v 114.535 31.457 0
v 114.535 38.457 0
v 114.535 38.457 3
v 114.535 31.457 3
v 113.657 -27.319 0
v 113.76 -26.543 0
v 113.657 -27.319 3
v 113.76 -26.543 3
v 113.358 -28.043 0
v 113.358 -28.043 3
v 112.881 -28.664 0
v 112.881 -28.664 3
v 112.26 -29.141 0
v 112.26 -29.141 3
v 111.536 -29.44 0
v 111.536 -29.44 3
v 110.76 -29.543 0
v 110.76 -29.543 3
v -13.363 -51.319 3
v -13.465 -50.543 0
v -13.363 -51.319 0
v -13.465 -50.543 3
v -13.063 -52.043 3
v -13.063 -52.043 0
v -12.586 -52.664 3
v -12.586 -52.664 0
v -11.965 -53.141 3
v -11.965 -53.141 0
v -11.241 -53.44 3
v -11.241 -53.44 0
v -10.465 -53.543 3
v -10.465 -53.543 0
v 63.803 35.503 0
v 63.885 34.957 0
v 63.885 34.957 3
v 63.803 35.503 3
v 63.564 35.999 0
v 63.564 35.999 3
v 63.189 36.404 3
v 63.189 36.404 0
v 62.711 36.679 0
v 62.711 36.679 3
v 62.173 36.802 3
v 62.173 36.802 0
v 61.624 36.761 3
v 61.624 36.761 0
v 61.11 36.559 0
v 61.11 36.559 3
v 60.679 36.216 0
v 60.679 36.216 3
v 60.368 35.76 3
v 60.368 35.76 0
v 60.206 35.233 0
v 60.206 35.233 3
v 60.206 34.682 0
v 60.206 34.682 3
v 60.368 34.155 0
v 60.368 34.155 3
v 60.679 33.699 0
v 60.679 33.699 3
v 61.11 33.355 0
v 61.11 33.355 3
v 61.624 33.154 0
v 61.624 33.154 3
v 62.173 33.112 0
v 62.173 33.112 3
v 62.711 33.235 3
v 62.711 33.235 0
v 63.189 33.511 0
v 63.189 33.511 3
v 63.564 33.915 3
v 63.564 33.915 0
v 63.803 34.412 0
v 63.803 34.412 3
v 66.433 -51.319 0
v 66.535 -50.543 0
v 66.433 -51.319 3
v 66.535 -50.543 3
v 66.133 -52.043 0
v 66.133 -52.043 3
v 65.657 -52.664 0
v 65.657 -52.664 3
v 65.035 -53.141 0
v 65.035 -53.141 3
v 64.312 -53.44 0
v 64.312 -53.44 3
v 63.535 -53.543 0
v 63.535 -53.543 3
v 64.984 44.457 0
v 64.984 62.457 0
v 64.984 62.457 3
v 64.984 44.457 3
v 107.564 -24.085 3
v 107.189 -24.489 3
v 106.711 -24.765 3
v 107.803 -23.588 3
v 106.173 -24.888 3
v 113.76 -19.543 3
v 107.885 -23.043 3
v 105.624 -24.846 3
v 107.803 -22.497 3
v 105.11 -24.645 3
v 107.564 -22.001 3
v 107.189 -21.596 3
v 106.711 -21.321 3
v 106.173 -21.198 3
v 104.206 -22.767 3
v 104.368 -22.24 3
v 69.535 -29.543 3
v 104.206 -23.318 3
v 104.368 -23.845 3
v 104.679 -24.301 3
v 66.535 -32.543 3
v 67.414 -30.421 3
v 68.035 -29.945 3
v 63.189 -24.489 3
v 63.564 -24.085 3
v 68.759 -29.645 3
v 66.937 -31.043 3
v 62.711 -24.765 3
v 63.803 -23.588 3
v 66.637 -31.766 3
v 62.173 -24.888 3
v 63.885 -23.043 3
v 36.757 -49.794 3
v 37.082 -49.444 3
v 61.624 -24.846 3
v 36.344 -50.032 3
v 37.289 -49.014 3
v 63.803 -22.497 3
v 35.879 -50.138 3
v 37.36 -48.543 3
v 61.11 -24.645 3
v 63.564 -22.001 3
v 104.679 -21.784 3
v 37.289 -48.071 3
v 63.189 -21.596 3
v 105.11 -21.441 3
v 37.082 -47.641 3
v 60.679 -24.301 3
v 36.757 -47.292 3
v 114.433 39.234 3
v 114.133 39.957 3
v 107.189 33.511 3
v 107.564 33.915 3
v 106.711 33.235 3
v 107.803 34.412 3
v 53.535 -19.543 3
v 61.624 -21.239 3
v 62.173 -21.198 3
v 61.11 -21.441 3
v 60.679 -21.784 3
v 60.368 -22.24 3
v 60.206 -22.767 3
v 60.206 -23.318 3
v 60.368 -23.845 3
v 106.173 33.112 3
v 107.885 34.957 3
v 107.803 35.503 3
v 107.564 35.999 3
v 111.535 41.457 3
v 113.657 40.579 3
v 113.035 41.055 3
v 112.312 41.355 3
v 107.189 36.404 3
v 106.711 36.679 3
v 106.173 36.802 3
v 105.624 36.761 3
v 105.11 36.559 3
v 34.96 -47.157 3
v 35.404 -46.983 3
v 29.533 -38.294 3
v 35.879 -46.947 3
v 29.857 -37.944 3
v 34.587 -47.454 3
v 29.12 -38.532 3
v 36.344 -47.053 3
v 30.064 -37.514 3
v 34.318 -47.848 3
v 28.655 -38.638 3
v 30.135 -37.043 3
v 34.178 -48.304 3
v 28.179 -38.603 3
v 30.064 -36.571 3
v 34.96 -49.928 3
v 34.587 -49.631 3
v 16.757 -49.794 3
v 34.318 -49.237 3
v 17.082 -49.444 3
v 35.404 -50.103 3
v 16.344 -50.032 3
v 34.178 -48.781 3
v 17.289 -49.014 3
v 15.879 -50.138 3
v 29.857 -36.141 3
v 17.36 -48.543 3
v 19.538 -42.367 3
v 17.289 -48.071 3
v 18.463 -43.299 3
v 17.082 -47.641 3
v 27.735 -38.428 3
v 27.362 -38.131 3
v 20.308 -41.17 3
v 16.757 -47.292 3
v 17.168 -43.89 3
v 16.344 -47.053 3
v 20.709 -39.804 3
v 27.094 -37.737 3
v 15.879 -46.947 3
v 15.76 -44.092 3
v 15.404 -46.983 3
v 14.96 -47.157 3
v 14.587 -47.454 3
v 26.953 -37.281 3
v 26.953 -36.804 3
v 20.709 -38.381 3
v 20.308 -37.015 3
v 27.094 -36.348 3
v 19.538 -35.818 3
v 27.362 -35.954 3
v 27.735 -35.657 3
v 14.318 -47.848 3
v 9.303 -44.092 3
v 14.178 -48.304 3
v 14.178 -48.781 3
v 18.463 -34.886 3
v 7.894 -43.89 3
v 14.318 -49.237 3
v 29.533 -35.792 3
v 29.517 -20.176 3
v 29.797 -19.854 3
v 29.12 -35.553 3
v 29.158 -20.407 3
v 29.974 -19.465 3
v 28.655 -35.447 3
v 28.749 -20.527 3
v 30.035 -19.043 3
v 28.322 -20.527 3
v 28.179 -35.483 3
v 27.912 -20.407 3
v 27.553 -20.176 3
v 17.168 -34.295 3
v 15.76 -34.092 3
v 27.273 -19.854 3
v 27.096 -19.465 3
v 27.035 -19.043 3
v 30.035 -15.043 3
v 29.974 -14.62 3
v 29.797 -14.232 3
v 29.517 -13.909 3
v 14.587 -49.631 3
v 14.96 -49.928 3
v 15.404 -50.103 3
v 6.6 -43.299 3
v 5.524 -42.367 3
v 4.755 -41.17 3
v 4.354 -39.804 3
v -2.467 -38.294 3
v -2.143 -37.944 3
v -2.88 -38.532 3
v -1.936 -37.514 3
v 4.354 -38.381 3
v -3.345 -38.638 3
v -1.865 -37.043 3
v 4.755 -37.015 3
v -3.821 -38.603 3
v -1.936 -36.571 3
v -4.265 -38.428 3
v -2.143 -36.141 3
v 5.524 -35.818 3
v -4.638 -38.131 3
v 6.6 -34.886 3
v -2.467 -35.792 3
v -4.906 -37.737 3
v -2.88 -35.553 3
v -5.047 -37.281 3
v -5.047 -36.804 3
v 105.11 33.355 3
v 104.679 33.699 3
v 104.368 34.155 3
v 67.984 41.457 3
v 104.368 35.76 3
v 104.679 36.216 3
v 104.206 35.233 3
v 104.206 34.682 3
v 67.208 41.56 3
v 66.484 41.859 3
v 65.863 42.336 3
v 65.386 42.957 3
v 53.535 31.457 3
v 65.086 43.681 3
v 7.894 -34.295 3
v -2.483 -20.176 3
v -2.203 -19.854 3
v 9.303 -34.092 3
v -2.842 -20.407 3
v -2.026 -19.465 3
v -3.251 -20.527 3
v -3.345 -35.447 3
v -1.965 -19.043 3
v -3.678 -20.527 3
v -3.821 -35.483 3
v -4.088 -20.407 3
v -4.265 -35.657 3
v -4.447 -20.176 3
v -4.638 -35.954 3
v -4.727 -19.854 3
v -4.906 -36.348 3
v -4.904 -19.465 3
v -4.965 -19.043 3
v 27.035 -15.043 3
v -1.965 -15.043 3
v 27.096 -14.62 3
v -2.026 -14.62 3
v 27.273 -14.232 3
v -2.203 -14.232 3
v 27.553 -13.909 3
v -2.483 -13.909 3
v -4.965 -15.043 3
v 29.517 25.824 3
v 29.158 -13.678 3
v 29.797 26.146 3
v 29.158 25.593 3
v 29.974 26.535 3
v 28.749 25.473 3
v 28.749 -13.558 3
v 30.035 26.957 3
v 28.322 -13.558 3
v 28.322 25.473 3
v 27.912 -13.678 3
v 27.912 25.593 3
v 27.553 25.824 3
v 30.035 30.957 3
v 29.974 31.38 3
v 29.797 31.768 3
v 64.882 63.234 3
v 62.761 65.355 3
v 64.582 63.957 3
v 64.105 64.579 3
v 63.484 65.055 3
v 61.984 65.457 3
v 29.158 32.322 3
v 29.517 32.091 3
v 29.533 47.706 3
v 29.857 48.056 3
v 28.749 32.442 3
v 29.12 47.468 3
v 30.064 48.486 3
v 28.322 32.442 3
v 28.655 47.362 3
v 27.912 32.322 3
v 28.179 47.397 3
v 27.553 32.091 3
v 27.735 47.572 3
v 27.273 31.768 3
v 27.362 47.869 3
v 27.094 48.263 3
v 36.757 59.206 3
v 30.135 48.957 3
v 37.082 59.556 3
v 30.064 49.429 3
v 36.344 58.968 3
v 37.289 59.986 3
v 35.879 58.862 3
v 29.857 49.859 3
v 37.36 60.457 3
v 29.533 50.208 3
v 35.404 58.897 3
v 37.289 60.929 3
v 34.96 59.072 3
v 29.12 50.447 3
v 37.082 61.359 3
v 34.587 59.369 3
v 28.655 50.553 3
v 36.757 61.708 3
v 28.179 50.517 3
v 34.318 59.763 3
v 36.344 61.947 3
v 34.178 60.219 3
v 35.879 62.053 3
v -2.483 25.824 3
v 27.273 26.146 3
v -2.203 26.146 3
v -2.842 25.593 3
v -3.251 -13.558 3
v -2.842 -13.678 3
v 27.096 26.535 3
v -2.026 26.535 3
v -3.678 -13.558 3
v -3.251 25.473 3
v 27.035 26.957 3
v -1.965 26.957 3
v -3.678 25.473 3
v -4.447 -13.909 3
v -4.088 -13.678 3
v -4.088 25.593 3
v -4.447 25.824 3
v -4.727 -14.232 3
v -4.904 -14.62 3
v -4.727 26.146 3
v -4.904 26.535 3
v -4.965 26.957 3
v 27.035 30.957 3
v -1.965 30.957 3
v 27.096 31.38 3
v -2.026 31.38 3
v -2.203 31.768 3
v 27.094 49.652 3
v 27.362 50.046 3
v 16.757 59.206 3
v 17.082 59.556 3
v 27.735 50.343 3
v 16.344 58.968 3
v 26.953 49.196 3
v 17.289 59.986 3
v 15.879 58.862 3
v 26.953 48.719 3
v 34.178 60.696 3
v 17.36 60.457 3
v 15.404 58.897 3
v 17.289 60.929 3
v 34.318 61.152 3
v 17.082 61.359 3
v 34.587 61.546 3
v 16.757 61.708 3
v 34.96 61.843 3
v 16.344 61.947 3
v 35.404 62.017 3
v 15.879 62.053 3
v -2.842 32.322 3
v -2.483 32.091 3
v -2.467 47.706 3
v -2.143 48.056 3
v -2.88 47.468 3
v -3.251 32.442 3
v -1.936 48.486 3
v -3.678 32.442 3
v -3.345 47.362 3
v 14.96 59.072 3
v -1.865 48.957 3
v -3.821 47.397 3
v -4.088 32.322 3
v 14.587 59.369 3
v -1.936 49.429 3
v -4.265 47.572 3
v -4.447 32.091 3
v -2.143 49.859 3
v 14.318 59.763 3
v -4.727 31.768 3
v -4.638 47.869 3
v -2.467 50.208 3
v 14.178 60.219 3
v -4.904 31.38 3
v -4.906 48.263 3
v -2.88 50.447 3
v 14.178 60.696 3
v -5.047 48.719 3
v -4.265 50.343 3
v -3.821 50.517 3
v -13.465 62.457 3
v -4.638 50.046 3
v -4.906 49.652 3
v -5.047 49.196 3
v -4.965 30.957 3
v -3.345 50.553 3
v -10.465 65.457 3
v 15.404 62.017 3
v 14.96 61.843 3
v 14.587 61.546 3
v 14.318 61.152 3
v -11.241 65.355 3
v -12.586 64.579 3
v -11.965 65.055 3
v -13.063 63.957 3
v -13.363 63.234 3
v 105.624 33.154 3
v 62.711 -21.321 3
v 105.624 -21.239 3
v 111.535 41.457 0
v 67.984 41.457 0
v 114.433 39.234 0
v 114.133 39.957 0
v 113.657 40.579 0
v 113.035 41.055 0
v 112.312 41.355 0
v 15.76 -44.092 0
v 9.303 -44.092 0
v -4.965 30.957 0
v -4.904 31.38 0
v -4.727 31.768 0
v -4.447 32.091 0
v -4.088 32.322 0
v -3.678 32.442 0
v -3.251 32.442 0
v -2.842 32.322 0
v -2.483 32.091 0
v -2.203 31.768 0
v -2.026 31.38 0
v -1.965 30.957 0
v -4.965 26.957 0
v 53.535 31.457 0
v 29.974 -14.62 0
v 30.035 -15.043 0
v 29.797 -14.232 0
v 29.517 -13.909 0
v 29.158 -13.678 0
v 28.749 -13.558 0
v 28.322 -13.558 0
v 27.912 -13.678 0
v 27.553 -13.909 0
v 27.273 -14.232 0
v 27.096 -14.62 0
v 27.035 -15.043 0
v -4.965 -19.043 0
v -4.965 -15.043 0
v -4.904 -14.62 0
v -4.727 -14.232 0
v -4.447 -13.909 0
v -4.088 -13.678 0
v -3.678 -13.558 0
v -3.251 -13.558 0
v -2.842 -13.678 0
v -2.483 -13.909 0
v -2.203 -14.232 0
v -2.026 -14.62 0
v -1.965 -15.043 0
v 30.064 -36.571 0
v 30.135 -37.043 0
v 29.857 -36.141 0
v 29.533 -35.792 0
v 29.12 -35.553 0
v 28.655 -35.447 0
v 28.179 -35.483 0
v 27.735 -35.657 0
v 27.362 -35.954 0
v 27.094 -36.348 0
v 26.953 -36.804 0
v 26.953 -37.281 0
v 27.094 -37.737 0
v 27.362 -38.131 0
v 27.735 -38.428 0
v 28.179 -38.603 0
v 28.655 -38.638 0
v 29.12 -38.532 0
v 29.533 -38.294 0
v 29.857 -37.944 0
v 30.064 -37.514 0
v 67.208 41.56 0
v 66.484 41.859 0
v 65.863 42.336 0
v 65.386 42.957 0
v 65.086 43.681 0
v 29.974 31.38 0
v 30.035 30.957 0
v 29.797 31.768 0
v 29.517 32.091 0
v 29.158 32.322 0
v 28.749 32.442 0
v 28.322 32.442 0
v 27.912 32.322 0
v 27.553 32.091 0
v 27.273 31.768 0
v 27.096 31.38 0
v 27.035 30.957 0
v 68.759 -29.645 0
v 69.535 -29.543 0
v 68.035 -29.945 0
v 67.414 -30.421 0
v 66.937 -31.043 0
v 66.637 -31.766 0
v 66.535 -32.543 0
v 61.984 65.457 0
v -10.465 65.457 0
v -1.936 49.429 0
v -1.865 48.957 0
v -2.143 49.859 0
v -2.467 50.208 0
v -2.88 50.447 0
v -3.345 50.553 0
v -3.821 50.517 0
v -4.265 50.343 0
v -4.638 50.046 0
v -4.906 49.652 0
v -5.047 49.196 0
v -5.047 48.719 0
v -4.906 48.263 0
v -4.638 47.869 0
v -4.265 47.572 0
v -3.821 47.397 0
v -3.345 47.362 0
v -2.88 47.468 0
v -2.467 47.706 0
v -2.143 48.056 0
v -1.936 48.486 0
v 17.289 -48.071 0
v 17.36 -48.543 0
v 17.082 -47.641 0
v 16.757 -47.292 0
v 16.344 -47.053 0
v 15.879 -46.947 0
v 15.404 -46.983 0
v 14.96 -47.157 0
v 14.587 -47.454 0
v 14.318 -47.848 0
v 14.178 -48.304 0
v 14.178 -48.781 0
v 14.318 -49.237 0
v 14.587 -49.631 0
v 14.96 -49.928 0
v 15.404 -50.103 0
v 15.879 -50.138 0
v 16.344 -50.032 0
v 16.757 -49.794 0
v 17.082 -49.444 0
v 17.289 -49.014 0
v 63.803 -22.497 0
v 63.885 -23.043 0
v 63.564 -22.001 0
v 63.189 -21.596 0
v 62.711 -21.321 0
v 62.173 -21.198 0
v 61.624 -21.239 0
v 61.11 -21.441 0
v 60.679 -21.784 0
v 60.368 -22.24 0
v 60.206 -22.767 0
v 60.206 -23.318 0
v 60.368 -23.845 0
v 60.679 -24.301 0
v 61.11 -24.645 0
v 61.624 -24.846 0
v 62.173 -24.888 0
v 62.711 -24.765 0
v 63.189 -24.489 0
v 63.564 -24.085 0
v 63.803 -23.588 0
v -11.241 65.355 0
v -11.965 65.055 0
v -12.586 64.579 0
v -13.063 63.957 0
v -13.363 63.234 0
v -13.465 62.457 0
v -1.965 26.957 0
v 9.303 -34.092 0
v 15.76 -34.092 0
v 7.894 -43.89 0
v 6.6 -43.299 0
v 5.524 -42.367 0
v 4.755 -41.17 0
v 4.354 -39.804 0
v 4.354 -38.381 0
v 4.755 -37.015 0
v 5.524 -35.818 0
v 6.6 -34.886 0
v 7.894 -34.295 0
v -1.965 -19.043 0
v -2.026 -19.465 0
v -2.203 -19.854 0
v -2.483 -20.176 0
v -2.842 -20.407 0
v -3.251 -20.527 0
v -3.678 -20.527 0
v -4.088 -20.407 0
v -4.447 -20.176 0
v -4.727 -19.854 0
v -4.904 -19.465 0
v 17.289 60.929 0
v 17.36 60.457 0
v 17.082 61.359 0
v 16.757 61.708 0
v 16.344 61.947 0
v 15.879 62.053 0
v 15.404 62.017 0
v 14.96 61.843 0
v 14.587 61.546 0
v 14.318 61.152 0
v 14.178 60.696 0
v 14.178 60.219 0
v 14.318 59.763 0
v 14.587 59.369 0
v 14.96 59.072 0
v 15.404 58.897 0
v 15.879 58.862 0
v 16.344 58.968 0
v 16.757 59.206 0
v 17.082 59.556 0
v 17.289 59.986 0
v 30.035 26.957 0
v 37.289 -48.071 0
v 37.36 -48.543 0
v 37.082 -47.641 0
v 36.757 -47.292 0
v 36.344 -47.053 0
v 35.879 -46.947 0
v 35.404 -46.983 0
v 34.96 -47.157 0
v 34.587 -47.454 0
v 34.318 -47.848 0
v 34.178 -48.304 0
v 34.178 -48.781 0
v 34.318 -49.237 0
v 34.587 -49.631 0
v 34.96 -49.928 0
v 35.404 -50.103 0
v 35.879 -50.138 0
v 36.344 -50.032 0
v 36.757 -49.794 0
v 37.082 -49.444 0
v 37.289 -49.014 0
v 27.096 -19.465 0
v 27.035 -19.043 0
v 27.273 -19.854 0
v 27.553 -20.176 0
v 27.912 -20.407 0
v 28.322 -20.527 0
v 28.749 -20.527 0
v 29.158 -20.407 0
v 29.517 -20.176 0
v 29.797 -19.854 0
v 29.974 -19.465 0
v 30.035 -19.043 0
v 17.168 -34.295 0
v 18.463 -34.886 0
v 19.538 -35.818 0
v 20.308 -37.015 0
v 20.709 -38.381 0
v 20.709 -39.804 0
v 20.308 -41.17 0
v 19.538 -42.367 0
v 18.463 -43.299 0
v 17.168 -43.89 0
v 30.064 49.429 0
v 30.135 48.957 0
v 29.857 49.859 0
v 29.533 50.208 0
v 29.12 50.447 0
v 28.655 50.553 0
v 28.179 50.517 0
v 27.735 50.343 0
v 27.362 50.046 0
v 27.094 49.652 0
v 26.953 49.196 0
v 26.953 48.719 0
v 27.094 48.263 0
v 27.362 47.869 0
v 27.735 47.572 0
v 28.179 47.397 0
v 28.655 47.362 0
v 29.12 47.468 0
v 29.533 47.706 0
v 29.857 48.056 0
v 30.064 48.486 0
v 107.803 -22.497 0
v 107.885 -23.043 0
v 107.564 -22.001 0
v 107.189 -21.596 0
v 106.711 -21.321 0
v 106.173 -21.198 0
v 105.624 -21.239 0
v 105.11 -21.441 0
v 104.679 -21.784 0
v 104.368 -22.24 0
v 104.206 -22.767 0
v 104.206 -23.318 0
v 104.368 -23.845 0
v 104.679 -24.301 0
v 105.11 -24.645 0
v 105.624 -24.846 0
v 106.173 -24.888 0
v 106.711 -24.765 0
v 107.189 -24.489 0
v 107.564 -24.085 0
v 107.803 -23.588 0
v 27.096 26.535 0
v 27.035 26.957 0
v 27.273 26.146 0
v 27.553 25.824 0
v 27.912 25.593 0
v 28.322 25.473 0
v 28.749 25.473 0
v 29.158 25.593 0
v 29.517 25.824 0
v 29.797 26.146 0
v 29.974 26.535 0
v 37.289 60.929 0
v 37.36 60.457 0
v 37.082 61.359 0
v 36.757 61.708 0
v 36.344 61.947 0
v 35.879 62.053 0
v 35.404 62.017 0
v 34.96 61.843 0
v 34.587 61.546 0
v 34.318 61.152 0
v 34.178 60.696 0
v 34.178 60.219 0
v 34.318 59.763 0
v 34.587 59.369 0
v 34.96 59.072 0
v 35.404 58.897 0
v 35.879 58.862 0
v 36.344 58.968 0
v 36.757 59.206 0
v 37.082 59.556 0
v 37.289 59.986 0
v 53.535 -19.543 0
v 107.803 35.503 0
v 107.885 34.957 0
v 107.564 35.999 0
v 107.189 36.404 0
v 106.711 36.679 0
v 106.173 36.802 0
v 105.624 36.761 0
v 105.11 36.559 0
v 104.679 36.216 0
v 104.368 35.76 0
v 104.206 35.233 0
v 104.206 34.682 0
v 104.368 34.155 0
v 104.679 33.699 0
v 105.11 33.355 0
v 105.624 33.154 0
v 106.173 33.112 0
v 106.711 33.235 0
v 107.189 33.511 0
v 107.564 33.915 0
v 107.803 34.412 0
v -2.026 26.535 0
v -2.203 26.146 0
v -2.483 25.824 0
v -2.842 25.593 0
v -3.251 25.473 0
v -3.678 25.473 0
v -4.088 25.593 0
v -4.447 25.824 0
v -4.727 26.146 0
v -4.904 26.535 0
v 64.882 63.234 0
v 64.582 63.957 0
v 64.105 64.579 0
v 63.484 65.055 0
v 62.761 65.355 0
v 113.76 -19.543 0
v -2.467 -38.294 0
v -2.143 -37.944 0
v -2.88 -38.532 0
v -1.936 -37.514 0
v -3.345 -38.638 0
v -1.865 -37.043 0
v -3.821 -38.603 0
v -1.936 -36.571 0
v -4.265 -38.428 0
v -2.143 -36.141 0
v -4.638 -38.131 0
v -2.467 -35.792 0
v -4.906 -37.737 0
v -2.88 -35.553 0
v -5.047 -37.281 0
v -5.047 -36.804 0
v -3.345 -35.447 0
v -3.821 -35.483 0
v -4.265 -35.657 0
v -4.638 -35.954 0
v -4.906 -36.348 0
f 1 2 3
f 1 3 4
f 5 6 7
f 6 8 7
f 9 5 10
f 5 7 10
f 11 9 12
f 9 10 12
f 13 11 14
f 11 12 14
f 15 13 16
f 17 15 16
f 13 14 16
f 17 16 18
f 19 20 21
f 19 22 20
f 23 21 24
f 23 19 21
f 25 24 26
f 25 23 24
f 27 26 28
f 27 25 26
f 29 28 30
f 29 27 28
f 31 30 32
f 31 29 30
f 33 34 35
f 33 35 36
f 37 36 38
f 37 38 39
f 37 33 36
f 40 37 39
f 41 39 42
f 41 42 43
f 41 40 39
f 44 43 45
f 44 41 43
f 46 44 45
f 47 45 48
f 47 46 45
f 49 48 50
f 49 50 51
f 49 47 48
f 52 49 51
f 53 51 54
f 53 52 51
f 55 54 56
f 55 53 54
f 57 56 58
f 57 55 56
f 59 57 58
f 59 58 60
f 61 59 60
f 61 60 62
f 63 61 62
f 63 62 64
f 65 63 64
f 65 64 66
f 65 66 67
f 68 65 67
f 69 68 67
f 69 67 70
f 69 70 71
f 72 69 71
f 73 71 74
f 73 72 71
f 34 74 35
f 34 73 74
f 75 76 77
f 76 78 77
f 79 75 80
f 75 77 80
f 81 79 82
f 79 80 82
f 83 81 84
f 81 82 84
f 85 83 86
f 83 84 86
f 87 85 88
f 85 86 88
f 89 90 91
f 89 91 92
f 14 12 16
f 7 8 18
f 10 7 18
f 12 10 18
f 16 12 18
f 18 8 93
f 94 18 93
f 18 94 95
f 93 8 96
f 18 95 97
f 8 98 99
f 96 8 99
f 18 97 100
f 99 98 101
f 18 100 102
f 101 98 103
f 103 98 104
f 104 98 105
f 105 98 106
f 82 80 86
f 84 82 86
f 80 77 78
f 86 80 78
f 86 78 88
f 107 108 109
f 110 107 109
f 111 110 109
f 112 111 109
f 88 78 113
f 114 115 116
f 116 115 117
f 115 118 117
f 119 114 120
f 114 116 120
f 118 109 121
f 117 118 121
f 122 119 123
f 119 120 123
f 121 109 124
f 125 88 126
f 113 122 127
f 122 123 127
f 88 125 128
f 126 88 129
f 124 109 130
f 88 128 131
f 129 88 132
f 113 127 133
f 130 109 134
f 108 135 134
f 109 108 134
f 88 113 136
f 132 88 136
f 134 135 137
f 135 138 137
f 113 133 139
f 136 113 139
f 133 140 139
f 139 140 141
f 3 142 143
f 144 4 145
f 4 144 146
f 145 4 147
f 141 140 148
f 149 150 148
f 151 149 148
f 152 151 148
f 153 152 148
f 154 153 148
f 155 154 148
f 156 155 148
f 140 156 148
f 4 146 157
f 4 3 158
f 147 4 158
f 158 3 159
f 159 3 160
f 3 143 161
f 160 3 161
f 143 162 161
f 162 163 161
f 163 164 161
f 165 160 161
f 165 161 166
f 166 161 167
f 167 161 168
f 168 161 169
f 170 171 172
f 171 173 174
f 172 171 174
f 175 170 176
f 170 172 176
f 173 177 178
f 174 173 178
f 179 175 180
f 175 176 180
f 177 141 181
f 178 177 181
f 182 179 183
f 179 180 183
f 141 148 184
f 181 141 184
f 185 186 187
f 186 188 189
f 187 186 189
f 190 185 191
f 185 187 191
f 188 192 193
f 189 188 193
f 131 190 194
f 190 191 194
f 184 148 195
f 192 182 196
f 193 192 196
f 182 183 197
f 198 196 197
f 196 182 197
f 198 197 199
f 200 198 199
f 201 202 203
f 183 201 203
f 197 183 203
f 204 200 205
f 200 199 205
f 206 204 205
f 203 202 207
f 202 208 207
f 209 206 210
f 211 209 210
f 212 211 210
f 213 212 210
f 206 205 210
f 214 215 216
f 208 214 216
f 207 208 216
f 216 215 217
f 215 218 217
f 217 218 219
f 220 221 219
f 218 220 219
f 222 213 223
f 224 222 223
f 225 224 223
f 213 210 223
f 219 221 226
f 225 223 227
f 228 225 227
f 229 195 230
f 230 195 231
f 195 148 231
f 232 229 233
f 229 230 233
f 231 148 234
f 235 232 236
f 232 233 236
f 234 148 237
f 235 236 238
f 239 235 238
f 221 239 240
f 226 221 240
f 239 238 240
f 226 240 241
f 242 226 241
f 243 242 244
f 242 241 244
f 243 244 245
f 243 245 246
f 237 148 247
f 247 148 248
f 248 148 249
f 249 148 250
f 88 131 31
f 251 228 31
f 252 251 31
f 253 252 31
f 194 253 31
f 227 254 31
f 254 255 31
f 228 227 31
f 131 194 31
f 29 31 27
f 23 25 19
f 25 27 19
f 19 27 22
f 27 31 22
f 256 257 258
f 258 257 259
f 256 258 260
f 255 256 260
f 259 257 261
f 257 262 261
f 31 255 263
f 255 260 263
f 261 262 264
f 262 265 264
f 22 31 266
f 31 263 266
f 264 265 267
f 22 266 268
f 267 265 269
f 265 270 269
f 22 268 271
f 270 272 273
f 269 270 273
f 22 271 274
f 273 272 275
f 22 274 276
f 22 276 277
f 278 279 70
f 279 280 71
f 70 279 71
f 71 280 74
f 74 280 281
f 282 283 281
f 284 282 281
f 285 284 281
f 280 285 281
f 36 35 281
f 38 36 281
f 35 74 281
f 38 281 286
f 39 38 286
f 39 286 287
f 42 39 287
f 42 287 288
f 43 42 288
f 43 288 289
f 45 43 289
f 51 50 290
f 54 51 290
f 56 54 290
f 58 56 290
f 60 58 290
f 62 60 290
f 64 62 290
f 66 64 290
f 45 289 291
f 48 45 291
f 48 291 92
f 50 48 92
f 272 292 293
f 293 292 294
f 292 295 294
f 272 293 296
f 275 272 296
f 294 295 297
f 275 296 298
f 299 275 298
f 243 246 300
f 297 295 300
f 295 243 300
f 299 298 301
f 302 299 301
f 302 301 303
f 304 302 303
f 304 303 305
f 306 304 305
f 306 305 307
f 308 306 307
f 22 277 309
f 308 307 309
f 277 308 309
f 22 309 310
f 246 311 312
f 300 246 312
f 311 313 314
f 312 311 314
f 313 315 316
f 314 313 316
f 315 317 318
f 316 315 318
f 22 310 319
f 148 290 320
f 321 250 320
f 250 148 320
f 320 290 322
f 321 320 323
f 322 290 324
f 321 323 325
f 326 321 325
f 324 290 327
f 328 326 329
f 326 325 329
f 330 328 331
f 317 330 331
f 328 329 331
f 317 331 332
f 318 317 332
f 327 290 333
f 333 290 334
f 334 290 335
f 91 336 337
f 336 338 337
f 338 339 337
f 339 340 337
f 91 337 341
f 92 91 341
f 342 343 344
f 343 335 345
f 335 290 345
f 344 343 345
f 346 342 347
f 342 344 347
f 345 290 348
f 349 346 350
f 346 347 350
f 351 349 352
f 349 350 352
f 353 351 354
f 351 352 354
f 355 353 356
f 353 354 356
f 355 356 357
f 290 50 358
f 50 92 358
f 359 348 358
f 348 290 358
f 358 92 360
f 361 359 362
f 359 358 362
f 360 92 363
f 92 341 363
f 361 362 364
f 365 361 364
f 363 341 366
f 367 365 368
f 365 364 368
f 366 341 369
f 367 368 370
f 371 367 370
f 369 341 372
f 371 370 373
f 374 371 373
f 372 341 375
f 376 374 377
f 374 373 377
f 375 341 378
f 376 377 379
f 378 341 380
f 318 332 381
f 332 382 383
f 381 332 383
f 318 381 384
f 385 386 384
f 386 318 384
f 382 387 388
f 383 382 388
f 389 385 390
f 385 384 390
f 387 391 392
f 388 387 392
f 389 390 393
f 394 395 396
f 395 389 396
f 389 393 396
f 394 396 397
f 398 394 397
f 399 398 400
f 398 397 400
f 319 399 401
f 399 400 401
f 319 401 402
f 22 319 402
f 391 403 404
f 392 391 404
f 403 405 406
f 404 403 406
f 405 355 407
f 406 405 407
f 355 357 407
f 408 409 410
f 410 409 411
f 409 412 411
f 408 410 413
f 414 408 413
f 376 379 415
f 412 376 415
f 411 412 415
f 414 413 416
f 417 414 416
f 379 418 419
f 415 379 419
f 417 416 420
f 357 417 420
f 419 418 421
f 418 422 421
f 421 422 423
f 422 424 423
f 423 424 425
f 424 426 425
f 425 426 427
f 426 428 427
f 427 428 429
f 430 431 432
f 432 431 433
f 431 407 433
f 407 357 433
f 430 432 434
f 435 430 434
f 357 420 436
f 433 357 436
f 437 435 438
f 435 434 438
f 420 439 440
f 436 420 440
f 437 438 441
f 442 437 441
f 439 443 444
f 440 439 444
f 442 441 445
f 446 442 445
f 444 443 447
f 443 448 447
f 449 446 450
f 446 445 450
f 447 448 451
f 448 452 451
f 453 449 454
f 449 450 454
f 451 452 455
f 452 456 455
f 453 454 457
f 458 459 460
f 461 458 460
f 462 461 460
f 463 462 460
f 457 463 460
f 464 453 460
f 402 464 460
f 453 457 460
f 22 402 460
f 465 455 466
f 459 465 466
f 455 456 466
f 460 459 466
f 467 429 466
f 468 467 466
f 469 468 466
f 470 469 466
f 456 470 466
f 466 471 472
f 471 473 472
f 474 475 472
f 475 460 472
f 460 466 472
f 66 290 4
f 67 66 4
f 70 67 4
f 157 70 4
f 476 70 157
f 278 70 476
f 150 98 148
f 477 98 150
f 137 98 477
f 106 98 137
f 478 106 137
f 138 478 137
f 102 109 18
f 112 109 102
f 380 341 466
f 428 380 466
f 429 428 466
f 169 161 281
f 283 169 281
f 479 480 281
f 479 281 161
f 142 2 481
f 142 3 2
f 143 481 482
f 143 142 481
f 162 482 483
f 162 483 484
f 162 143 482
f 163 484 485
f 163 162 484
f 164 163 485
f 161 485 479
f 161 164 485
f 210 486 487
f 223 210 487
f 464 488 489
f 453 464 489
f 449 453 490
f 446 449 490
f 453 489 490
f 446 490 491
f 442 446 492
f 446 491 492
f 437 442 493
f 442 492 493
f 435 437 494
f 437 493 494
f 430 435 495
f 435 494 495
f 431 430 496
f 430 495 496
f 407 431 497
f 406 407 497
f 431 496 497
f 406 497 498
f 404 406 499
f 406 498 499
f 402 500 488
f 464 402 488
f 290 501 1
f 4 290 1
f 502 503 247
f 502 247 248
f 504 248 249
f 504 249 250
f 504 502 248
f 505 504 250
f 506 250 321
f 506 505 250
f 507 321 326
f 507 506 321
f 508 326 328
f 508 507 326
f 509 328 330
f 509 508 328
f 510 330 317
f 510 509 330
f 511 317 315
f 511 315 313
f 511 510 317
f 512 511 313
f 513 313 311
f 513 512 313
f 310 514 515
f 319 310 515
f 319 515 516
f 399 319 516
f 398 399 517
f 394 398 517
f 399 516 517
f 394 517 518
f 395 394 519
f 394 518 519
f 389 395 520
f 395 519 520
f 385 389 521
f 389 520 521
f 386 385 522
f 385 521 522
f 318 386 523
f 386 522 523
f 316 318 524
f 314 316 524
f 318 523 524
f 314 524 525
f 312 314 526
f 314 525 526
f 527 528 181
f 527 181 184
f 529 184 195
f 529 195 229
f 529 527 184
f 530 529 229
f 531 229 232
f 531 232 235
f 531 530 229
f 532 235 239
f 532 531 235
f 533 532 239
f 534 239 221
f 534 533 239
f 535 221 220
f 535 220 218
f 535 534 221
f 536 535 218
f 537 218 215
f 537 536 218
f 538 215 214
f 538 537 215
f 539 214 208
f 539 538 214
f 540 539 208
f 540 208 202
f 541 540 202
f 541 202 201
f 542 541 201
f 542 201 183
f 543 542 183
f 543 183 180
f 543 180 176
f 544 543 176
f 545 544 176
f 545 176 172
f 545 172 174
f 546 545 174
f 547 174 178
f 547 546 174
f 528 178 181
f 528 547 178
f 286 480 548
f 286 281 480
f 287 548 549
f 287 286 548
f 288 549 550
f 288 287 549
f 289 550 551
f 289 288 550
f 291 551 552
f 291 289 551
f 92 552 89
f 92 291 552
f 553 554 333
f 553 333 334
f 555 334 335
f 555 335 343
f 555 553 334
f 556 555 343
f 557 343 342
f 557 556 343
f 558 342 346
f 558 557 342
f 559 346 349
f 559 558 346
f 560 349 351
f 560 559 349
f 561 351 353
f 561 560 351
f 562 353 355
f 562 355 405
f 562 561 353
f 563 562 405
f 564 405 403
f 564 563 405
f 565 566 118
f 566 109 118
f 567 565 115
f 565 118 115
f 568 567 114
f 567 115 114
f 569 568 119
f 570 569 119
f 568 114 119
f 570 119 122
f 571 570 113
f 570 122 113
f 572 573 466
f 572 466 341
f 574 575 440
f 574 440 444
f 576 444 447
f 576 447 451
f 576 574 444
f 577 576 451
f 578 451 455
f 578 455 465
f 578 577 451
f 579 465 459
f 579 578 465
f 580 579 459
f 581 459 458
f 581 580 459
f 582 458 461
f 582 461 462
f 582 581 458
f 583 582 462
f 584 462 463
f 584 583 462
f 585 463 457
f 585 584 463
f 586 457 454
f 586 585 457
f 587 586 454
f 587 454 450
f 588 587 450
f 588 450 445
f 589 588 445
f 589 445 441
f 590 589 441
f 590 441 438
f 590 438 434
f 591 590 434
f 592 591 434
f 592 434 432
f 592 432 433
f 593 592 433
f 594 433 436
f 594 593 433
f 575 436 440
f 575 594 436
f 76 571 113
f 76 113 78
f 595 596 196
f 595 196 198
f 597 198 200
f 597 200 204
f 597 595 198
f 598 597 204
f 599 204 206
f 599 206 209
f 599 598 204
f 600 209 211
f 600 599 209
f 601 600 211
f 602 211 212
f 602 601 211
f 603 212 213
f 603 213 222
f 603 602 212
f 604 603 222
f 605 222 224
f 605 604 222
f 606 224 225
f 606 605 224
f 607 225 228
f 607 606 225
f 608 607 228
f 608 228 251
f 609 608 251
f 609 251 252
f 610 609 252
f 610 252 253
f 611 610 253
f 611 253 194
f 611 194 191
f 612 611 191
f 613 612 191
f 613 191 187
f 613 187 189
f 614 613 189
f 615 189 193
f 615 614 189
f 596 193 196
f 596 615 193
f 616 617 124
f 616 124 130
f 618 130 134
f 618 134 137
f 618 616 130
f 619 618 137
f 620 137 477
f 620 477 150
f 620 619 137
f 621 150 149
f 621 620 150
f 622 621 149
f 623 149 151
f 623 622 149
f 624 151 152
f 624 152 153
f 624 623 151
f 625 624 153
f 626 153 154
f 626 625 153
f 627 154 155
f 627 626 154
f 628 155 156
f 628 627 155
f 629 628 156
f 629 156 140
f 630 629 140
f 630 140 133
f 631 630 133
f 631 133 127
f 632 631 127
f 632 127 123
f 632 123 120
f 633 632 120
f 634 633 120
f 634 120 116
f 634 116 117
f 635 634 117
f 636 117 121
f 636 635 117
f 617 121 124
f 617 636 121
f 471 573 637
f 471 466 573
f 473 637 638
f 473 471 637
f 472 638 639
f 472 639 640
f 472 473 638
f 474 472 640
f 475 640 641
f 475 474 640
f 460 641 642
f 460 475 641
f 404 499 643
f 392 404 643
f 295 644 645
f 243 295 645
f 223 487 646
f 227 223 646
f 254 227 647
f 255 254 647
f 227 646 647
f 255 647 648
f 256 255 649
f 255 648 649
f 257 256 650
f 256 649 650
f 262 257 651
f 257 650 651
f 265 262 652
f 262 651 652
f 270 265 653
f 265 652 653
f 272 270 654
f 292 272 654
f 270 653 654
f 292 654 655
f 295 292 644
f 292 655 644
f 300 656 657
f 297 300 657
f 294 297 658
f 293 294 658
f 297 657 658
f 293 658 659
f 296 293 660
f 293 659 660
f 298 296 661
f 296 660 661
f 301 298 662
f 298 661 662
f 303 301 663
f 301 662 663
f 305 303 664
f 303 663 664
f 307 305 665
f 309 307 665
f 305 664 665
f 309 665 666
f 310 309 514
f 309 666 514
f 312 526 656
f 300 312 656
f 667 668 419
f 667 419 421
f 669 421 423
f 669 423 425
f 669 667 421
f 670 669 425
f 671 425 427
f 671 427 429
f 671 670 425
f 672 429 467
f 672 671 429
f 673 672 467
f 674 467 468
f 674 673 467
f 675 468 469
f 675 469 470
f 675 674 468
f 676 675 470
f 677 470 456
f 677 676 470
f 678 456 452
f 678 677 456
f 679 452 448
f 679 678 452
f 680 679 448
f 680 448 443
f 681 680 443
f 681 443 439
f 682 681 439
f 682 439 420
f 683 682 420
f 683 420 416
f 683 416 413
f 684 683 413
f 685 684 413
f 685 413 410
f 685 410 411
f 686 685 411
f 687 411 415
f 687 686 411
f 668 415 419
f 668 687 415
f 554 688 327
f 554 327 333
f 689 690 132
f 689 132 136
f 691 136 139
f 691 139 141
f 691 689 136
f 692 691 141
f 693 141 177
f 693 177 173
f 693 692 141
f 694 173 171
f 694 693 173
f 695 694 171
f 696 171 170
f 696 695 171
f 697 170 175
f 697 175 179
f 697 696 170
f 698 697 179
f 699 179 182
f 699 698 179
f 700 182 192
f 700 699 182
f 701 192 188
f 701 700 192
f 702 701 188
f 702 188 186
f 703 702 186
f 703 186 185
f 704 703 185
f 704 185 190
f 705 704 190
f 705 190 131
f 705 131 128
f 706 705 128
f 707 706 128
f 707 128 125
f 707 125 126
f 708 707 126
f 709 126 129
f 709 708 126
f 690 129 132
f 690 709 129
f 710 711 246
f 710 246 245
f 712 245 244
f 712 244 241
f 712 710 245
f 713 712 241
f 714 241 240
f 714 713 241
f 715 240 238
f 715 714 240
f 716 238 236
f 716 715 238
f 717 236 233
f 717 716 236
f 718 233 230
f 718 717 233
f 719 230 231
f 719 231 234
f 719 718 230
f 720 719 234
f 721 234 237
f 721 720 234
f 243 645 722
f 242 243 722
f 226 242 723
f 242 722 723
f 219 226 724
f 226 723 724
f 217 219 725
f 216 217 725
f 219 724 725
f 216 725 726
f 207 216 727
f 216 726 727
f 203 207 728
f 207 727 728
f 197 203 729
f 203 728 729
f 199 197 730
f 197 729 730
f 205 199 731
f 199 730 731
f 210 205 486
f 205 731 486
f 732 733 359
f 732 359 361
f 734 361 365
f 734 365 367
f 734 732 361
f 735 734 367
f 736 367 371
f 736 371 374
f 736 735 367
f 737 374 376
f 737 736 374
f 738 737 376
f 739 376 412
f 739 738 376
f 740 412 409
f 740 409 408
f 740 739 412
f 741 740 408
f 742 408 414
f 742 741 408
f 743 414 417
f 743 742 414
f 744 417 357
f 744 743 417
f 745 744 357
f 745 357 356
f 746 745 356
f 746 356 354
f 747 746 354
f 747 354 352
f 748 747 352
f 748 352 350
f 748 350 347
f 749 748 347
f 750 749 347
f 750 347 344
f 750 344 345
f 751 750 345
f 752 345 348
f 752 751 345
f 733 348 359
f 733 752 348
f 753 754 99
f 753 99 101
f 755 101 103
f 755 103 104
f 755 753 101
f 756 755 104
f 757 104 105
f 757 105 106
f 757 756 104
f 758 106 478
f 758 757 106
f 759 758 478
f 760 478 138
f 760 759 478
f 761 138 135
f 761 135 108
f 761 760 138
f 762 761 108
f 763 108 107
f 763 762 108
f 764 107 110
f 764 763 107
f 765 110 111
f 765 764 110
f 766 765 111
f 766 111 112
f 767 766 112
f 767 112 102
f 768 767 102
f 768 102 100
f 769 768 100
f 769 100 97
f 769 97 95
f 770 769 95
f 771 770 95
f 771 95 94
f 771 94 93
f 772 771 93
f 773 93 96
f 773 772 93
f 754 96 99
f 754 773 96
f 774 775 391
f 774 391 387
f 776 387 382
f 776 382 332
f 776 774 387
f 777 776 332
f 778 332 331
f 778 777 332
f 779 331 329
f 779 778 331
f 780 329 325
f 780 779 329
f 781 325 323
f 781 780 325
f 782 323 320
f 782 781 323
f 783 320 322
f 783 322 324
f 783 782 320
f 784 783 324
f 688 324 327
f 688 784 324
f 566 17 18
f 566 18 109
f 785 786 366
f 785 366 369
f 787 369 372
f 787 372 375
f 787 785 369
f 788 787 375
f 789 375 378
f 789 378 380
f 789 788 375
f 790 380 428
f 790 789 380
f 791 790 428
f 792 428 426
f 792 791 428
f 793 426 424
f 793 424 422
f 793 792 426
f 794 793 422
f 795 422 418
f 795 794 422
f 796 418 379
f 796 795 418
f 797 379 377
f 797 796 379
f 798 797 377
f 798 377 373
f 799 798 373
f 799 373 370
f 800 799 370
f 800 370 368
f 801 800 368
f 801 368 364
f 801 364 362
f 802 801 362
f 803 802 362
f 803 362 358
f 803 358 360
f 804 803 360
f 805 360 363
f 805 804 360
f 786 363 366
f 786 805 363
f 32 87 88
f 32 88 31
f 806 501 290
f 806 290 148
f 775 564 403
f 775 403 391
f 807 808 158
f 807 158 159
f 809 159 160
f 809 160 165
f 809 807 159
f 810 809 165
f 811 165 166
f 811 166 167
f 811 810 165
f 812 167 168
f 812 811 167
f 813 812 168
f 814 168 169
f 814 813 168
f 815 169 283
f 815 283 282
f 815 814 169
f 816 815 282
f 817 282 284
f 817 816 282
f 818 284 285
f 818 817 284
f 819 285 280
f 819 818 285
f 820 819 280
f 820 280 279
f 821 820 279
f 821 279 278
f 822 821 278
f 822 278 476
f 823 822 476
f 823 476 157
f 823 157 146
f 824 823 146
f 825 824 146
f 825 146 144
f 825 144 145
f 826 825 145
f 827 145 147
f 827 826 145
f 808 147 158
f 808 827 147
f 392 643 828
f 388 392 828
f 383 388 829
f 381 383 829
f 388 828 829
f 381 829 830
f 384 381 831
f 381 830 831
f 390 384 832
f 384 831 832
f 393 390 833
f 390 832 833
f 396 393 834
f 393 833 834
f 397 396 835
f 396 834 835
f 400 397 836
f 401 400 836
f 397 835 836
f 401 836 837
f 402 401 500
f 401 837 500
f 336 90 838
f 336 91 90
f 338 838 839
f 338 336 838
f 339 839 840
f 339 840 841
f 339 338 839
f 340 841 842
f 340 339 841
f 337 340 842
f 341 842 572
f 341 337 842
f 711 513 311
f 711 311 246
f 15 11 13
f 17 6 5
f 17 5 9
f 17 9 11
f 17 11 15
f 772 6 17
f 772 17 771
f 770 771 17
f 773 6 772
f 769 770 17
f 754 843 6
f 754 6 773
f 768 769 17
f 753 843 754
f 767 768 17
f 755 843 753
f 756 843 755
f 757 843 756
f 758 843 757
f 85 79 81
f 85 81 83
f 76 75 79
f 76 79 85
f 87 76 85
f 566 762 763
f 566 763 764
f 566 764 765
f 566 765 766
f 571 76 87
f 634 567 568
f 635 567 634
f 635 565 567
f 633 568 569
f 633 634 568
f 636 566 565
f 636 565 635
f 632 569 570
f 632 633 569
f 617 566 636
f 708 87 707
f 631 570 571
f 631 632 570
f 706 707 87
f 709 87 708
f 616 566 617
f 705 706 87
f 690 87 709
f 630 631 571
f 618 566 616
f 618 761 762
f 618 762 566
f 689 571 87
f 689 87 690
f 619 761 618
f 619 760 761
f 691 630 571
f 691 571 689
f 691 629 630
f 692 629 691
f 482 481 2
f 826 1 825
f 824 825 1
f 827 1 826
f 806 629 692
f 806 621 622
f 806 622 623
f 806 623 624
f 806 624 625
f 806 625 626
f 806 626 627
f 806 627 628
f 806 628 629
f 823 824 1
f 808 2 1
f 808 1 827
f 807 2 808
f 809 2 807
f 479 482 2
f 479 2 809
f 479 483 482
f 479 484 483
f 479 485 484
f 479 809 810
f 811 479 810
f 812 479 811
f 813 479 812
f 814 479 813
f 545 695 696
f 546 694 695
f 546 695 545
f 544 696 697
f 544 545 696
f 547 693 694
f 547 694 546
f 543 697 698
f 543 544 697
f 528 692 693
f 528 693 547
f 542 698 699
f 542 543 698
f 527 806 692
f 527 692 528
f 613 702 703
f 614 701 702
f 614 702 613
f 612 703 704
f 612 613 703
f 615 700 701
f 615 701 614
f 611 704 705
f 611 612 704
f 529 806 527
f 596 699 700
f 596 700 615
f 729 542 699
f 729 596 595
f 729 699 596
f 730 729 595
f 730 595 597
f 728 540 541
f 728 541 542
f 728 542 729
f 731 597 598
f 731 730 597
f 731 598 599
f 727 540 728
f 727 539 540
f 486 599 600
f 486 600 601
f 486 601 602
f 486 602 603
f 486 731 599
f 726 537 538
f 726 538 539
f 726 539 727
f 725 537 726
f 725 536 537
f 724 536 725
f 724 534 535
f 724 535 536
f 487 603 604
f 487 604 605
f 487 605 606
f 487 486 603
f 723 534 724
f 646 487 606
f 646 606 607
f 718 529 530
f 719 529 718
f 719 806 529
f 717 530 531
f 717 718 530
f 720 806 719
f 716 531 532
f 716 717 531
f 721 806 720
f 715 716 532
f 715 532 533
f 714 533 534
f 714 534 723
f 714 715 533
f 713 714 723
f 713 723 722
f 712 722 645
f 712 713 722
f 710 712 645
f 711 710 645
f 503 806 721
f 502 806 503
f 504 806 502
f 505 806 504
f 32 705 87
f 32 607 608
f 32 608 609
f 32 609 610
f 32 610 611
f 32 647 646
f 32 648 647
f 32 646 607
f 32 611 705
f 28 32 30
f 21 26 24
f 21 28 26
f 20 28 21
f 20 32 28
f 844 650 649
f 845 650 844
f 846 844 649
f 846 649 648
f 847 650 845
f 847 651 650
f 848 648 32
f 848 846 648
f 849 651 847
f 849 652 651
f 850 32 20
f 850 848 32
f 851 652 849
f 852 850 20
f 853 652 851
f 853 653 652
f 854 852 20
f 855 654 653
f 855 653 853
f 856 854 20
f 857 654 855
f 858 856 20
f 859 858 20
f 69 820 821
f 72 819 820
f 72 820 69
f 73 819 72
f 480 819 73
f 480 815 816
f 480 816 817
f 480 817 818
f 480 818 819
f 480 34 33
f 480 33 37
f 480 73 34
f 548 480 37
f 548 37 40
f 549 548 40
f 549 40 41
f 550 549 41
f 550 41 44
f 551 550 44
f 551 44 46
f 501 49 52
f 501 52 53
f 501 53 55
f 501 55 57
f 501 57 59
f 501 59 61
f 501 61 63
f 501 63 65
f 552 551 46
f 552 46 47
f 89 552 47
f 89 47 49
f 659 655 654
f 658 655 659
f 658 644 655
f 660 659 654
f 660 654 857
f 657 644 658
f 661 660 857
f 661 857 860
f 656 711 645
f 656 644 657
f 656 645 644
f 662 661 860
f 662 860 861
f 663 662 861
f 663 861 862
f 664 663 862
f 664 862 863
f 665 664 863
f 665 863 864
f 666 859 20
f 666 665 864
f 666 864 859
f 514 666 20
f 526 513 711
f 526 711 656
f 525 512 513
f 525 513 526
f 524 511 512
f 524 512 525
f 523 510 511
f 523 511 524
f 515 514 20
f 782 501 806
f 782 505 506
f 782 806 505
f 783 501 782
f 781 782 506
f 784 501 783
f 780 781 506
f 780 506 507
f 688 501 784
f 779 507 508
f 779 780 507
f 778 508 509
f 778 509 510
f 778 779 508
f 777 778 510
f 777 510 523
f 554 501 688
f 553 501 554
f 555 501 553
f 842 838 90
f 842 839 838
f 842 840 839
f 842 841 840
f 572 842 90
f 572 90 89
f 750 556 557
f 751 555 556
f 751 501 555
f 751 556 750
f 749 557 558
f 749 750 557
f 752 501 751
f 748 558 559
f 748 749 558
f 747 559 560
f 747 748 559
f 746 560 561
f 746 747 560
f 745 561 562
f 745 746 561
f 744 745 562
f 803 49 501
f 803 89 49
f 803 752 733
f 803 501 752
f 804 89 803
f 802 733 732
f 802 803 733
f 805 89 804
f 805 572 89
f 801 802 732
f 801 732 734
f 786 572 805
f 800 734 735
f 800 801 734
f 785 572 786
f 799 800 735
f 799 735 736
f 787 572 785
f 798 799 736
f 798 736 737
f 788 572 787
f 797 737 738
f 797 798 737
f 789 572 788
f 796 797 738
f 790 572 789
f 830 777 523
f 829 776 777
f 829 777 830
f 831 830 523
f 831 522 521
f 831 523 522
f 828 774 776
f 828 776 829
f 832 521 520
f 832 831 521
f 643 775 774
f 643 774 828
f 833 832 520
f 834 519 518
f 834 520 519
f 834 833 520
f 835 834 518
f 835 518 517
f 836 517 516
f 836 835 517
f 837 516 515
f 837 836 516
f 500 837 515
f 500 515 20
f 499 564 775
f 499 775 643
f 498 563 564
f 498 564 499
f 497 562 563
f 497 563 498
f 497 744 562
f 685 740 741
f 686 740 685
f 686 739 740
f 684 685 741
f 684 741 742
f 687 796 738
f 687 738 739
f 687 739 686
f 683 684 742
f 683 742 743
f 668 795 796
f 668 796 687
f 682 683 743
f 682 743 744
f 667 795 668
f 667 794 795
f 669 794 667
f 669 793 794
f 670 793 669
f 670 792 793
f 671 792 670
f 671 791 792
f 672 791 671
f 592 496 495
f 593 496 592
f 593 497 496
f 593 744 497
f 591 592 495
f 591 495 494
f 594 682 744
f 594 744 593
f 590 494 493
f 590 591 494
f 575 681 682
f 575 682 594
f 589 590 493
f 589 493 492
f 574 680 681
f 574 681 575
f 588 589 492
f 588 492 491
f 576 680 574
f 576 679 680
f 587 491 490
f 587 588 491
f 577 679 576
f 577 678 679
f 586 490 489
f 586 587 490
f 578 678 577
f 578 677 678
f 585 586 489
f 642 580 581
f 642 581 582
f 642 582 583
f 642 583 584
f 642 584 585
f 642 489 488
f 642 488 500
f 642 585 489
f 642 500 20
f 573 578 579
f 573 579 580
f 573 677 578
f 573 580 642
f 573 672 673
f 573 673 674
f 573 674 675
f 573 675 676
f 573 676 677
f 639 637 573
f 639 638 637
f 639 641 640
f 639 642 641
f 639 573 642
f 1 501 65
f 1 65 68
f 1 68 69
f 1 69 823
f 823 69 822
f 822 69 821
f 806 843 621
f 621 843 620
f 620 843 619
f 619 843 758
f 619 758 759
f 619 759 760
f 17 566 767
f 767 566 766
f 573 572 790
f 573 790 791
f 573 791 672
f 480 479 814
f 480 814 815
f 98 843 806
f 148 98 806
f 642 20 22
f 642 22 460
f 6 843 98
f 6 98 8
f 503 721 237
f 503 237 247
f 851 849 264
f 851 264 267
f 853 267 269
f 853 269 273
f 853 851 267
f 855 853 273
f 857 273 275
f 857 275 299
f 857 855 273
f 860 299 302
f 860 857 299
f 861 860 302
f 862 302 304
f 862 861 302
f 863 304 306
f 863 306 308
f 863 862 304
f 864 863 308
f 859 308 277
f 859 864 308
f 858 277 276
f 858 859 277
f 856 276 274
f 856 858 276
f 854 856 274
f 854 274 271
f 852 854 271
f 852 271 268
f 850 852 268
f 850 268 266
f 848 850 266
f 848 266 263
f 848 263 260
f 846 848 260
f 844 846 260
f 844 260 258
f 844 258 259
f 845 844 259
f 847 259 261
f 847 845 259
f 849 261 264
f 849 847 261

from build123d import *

# Parameters (mm, degrees)
SKETCH_1_R      = 1.6
SKETCH_1_R_2    = 1.85
EXTRUDE_1_DEPTH = 3
FILLET_1_R      = 3


with BuildPart() as part:
    # 草图1 → 凸台-拉伸1 (new body)
    with BuildSketch(Plane.XY):
        Polygon((65.759662845, 31.457301477), (53.535196603, 31.457301477), (53.535196603, -19.542698523), (64.984129087, -19.542698523), (113.759662845, -19.542698523), (113.759662845, -29.542698523), (66.535196603, -29.542698523), (66.535196603, -53.542698523), (-13.464803397, -53.542698523), (-13.464803397, 65.457301477), (64.984129087, 65.457301477), (64.984129087, 41.457301477), (114.535196603, 41.457301477), (114.535196603, 31.457301477), align=None)
        with Locations((15.759662845, 60.457301477)):
            Circle(SKETCH_1_R, mode=Mode.SUBTRACT)
        with Locations((35.759662845, 60.457301477)):
            Circle(SKETCH_1_R, mode=Mode.SUBTRACT)
        with Locations((15.759662845, -48.542698523)):
            Circle(SKETCH_1_R, mode=Mode.SUBTRACT)
        with Locations((35.759662845, -48.542698523)):
            Circle(SKETCH_1_R, mode=Mode.SUBTRACT)
        with Locations((-3.464803397, 48.957301477)):
            Circle(SKETCH_1_R, mode=Mode.SUBTRACT)
        with Locations((28.535196603, 48.957301477)):
            Circle(SKETCH_1_R, mode=Mode.SUBTRACT)
        with Locations((-3.464803397, -37.042698523)):
            Circle(SKETCH_1_R, mode=Mode.SUBTRACT)
        with Locations((28.535196603, -37.042698523)):
            Circle(SKETCH_1_R, mode=Mode.SUBTRACT)
        with Locations((62.035196603, -23.042698523)):
            Circle(SKETCH_1_R_2, mode=Mode.SUBTRACT)
        with Locations((106.035196603, -23.042698523)):
            Circle(SKETCH_1_R_2, mode=Mode.SUBTRACT)
        with Locations((62.035196603, 34.957301477)):
            Circle(SKETCH_1_R_2, mode=Mode.SUBTRACT)
        with Locations((106.035196603, 34.957301477)):
            Circle(SKETCH_1_R_2, mode=Mode.SUBTRACT)
        with BuildLine():
            Line((9.302741514, -34.092463325), (15.759662845, -34.092463325))
            ThreePointArc((15.759662845, -34.092463325), (20.759662845, -39.092463325), (15.759662845, -44.092463325))
            Line((15.759662845, -44.092463325), (9.302741514, -44.092463325))
            ThreePointArc((9.302741514, -44.092463325), (4.302741514, -39.092463325), (9.302741514, -34.092463325))
        make_face(mode=Mode.SUBTRACT)
        with BuildLine():
            Line((-1.964803397, 30.957301477), (-1.964803397, 26.957301477))
            ThreePointArc((-1.964803397, 26.957301477), (-3.464803397, 25.457301477), (-4.964803397, 26.957301477))
            Line((-4.964803397, 26.957301477), (-4.964803397, 30.957301477))
            ThreePointArc((-4.964803397, 30.957301477), (-3.464803397, 32.457301477), (-1.964803397, 30.957301477))
        make_face(mode=Mode.SUBTRACT)
        with BuildLine():
            Line((-1.964803397, -15.042698523), (-1.964803397, -19.042698523))
            ThreePointArc((-1.964803397, -19.042698523), (-3.464803397, -20.542698523), (-4.964803397, -19.042698523))
            Line((-4.964803397, -19.042698523), (-4.964803397, -15.042698523))
            ThreePointArc((-4.964803397, -15.042698523), (-3.464803397, -13.542698523), (-1.964803397, -15.042698523))
        make_face(mode=Mode.SUBTRACT)
        with BuildLine():
            Line((27.035196603, -15.042698523), (27.035196603, -19.042698523))
            ThreePointArc((27.035196603, -19.042698523), (28.535196603, -20.542698523), (30.035196603, -19.042698523))
            Line((30.035196603, -19.042698523), (30.035196603, -15.042698523))
            ThreePointArc((30.035196603, -15.042698523), (28.535196603, -13.542698523), (27.035196603, -15.042698523))
        make_face(mode=Mode.SUBTRACT)
        with BuildLine():
            Line((27.035196603, 30.957301477), (27.035196603, 26.957301477))
            ThreePointArc((27.035196603, 26.957301477), (28.535196603, 25.457301477), (30.035196603, 26.957301477))
            Line((30.035196603, 26.957301477), (30.035196603, 30.957301477))
            ThreePointArc((30.035196603, 30.957301477), (28.535196603, 32.457301477), (27.035196603, 30.957301477))
        make_face(mode=Mode.SUBTRACT)
    extrude(amount=EXTRUDE_1_DEPTH)

    # 圆角1
    fillet_1_edges = [part.edges().sort_by_distance(p)[0] for p in [
        (-13.464803397, 65.457301477, 1.5),
        (64.984129087, 65.457301477, 1.5),
        (64.984129087, 41.457301477, 1.5),
        (114.535196603, 41.457301477, 1.5),
        (113.759662845, -29.542698523, 1.5),
        (66.535196603, -29.542698523, 1.5),
        (66.535196603, -53.542698523, 1.5),
        (-13.464803397, -53.542698523, 1.5),
    ]]
    fillet(fillet_1_edges, radius=FILLET_1_R)


solid = part.part
